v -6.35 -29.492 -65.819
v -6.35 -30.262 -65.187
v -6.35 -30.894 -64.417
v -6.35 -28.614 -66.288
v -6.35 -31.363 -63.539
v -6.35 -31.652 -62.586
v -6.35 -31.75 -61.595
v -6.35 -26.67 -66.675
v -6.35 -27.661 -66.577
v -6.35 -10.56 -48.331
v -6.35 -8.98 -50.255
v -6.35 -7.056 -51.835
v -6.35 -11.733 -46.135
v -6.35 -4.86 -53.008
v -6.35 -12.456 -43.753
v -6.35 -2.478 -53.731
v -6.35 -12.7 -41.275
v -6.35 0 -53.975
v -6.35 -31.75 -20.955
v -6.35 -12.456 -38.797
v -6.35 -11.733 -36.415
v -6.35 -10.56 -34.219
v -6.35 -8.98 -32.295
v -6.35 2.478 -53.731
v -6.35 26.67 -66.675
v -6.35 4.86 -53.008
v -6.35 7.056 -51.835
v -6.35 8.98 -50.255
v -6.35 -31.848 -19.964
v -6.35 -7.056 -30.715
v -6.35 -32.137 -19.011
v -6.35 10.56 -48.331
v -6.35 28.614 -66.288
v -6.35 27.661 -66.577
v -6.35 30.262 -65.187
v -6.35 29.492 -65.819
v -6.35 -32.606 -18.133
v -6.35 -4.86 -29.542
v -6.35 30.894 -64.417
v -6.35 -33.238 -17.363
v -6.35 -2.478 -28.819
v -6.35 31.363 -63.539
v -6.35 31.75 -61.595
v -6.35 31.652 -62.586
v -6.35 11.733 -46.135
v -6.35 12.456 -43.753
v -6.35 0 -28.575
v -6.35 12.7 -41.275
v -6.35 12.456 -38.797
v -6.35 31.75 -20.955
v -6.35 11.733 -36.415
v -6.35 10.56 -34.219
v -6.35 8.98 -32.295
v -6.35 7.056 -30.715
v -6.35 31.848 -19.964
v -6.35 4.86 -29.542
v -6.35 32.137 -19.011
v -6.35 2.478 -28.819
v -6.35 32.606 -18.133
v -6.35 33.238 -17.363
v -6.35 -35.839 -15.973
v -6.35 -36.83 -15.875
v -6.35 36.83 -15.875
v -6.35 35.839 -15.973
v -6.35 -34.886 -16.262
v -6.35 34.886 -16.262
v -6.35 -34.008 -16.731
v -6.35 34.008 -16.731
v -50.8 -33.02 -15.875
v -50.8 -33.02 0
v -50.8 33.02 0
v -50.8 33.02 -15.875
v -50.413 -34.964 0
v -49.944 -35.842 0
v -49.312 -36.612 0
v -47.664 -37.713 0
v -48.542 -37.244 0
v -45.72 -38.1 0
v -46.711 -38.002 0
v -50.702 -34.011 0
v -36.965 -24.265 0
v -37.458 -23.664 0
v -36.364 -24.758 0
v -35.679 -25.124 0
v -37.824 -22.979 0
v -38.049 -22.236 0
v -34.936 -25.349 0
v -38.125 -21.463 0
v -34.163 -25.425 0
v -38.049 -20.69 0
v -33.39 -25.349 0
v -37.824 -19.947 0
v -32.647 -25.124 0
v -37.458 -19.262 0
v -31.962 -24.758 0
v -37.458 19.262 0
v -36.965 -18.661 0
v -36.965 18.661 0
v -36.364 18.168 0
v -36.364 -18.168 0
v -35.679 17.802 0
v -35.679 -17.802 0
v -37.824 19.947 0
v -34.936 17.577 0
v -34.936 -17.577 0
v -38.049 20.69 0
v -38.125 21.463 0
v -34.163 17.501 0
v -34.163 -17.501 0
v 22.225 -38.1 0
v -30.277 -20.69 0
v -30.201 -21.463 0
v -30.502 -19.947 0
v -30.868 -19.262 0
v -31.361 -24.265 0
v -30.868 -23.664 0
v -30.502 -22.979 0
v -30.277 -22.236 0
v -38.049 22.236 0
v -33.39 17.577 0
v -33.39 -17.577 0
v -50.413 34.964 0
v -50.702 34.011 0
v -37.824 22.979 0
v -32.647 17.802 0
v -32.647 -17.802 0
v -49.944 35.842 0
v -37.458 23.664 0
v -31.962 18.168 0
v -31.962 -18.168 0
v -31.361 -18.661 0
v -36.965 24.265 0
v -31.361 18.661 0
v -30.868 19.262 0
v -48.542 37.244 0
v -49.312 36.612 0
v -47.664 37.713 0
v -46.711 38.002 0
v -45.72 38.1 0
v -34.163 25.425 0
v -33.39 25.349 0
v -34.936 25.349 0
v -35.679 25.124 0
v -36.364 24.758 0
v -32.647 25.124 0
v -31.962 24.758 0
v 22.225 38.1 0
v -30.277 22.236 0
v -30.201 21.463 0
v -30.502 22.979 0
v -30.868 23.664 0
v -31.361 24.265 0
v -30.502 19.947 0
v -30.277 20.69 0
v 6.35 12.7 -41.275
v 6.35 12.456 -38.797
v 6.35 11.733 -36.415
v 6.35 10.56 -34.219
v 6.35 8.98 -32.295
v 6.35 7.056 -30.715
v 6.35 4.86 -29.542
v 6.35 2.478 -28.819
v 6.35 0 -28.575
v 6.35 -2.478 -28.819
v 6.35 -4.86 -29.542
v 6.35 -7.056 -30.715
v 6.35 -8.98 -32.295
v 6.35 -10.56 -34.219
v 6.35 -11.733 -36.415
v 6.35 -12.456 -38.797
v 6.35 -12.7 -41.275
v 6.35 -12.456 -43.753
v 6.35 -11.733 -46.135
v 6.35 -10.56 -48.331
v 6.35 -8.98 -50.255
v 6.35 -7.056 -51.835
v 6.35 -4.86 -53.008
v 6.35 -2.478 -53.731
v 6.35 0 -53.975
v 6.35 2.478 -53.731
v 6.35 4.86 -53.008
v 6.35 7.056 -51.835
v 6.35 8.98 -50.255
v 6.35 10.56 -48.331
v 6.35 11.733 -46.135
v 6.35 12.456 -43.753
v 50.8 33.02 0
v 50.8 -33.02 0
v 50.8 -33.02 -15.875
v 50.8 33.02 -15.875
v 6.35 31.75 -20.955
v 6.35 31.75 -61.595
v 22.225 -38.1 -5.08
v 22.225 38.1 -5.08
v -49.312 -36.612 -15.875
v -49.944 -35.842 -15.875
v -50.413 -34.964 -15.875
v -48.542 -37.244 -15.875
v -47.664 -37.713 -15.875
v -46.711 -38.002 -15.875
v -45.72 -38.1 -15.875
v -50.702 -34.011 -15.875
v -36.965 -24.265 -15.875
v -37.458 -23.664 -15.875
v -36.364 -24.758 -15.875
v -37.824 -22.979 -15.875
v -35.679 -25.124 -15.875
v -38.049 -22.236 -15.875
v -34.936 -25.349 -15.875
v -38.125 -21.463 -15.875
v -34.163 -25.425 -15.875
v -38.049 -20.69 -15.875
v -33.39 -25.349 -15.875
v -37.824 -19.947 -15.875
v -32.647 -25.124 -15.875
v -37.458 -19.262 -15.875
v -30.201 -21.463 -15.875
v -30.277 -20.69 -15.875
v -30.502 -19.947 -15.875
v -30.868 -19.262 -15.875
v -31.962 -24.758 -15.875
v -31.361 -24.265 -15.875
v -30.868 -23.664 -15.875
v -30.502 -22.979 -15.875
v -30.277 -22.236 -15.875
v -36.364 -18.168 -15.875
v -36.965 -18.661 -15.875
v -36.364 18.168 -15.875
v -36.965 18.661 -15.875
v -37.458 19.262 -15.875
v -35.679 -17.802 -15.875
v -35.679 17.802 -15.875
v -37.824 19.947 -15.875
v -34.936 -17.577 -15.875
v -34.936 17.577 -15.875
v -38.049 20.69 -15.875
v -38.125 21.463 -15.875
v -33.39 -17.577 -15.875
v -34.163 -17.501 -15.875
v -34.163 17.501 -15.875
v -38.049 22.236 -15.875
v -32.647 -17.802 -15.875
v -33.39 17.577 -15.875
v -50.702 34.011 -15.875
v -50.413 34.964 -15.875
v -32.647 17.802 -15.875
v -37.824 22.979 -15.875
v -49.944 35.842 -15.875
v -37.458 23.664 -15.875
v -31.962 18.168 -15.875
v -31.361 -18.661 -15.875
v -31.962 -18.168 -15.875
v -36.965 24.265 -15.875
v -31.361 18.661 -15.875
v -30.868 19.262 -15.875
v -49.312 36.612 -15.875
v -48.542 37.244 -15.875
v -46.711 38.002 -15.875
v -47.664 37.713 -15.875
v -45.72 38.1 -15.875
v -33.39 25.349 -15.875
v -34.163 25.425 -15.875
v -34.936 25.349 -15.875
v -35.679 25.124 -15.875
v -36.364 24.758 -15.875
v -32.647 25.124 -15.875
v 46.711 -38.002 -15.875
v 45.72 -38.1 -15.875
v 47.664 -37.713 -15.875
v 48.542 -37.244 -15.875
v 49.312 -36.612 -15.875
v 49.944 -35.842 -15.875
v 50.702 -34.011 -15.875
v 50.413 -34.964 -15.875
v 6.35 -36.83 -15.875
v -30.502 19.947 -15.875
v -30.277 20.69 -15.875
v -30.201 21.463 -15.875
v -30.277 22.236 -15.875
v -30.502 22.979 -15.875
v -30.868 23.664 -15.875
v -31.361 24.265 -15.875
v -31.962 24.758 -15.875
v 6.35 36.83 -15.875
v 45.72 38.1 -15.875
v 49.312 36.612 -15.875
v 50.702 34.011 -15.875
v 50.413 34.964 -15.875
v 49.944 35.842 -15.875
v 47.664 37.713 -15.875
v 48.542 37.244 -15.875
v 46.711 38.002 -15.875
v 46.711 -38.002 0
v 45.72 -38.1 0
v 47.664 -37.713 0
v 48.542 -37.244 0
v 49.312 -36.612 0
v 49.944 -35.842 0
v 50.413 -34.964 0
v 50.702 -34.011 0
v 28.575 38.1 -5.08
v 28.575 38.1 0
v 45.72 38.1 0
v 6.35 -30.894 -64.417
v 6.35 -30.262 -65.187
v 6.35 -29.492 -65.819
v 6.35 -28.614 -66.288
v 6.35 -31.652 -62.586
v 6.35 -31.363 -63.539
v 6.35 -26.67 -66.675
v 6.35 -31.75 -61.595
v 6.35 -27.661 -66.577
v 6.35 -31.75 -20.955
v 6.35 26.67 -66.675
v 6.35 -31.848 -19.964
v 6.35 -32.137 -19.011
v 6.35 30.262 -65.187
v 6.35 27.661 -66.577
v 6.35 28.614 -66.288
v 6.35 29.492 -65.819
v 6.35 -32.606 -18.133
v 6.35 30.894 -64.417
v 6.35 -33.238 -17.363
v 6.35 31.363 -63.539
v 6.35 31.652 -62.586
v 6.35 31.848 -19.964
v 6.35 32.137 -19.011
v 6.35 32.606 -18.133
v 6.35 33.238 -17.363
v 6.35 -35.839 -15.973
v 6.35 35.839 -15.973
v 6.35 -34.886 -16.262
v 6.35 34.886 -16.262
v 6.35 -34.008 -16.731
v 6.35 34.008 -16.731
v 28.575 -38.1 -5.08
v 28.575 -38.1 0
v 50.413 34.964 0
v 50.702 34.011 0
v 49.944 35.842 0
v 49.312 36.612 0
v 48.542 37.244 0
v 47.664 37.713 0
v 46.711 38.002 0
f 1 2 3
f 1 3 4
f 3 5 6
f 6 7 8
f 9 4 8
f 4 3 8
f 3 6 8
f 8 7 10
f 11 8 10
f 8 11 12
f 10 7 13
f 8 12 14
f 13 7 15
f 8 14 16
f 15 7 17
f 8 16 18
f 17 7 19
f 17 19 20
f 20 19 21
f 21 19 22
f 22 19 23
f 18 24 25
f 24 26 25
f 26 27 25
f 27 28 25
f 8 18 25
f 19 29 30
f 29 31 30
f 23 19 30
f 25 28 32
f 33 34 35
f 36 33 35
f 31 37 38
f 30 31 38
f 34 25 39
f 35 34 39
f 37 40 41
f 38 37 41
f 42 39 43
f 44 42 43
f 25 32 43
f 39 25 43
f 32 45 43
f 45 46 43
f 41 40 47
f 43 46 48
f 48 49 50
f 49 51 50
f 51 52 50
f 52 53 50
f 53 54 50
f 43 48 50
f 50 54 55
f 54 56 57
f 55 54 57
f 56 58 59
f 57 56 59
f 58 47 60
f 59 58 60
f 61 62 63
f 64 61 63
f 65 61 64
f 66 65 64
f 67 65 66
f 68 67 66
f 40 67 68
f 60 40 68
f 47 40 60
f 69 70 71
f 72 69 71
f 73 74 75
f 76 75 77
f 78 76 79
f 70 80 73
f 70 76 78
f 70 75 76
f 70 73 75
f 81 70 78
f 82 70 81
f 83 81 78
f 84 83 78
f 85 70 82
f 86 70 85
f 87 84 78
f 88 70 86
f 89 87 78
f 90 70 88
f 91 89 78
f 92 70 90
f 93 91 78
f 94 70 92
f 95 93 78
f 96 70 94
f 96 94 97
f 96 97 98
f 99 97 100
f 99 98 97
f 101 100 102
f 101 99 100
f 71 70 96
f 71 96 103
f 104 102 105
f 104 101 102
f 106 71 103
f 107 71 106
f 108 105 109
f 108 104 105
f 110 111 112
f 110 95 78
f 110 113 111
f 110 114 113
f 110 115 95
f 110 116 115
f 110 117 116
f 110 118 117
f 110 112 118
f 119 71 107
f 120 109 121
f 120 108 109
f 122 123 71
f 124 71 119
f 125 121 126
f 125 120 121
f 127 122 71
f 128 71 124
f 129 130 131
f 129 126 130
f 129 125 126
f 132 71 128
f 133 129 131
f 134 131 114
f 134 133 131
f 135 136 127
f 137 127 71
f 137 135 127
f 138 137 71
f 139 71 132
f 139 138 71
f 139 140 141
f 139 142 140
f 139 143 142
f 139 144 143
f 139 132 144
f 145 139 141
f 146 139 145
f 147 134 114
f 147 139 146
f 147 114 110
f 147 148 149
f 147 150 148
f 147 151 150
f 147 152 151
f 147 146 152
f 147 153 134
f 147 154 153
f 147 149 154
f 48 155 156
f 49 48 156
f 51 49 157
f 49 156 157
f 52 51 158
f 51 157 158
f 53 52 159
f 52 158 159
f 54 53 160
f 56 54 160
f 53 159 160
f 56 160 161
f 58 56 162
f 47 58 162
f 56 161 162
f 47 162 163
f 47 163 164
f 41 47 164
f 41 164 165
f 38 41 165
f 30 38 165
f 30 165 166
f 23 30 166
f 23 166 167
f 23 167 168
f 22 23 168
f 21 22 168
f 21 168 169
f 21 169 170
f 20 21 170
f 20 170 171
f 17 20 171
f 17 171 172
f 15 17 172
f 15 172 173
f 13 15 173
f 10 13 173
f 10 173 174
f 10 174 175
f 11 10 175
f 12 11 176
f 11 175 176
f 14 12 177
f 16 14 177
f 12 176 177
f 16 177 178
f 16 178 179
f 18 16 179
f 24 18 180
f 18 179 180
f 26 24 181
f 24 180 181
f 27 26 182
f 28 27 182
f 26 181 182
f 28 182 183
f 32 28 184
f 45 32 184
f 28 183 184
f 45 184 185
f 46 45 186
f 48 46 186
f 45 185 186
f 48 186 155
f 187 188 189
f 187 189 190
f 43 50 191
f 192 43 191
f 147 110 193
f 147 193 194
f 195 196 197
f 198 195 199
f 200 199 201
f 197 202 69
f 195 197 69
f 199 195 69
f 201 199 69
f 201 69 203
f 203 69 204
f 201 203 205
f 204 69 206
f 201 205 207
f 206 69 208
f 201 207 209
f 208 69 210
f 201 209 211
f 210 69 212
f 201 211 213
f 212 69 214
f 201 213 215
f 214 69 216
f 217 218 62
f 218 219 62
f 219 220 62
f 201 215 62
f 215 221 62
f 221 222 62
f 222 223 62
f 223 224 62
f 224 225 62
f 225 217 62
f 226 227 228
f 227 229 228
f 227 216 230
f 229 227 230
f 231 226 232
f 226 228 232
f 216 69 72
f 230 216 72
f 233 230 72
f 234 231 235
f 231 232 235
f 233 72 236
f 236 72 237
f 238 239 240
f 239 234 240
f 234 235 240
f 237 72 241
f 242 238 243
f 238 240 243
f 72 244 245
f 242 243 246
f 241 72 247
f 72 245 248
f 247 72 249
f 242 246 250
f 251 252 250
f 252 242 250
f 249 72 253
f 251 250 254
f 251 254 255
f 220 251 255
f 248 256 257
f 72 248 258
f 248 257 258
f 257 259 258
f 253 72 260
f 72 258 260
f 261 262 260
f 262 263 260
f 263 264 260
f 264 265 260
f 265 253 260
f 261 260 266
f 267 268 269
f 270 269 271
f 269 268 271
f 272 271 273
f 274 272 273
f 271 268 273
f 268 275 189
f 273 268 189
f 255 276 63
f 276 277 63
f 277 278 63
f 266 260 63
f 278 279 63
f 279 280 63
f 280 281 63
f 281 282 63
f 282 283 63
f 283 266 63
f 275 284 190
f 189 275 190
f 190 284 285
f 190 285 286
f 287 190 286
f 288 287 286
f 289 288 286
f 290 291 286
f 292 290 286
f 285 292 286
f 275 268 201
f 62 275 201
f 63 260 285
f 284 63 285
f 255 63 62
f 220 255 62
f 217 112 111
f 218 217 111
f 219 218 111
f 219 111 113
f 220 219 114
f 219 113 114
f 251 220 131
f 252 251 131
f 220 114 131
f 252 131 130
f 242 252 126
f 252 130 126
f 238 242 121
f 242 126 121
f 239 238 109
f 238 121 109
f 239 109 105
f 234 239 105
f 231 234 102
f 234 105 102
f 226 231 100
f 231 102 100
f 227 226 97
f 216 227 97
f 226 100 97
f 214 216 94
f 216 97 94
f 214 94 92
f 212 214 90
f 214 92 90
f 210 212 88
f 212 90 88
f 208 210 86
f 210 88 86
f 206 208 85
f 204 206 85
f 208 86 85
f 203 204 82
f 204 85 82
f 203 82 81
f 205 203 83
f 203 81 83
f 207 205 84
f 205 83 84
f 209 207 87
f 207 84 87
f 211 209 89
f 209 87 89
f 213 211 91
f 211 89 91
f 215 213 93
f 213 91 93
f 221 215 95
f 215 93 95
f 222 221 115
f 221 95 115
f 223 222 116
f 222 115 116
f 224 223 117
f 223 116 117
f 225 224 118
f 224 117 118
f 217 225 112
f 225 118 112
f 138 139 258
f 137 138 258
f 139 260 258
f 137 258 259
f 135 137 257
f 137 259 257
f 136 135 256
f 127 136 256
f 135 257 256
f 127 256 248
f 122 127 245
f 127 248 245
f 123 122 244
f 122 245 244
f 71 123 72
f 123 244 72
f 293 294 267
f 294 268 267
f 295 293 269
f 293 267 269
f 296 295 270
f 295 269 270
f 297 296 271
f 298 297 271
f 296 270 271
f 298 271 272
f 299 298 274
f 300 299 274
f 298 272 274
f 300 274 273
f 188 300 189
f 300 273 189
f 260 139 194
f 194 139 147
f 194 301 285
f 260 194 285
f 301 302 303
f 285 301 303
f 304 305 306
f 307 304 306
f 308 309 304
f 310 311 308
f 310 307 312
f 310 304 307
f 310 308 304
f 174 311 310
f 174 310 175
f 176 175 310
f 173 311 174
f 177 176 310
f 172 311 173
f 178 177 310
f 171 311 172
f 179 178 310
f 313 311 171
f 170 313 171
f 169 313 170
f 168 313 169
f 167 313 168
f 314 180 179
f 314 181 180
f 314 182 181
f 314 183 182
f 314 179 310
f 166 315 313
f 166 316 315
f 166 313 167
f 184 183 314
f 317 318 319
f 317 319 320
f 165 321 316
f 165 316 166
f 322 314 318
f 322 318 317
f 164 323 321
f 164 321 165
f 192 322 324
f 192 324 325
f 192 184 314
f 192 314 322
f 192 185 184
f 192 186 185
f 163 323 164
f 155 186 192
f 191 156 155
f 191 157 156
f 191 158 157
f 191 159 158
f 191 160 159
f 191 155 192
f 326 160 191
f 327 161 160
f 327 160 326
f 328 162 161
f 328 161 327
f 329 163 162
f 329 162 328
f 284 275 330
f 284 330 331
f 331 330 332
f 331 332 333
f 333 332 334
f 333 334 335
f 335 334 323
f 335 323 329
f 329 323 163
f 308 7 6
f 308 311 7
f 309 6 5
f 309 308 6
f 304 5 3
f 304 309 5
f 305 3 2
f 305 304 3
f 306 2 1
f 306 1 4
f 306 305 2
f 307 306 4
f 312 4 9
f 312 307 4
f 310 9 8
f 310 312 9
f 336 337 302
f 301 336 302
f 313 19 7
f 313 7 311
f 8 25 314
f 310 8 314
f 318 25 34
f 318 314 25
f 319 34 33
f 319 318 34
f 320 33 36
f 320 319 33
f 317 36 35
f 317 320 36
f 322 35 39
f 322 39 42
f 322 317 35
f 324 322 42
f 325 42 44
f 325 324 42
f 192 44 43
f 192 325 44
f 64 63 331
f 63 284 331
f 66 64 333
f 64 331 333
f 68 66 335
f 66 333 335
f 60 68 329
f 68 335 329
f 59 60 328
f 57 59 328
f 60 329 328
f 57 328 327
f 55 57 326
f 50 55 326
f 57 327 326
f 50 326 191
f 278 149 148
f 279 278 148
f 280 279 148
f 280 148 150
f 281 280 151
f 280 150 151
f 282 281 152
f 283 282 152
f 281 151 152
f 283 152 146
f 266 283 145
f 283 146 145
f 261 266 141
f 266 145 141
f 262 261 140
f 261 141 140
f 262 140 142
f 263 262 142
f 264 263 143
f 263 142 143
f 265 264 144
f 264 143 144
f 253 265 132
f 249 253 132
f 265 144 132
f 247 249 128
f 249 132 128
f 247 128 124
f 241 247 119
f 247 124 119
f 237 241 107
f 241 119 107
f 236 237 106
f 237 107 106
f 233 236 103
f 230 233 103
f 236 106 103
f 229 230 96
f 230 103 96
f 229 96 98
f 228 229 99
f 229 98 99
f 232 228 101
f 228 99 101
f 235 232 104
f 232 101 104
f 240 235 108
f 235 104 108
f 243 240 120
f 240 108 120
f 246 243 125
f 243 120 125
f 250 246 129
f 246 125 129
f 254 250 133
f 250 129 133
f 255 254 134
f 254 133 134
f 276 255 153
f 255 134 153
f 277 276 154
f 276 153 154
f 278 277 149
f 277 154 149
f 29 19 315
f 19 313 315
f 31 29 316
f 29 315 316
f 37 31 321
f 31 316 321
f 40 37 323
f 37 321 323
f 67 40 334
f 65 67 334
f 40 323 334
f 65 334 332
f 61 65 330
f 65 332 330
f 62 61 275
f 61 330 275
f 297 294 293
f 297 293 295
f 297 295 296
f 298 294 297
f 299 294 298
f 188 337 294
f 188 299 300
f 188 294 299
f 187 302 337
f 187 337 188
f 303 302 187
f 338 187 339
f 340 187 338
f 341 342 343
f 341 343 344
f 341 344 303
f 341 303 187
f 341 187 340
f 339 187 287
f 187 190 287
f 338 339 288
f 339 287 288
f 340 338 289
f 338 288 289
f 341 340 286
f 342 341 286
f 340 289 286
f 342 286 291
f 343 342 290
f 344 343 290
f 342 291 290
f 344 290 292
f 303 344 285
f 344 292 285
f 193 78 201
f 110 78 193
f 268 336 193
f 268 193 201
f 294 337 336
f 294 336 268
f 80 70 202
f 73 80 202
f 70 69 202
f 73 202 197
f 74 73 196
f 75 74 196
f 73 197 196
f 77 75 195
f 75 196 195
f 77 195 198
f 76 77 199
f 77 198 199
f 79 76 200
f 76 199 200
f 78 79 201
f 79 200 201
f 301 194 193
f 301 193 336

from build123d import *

# Parameters (mm, degrees)
F0_W     = 101.6
F0_H     = 76.2
F0_R     = 3.9624
F0_W_2   = 12.7
F0_H_2   = 63.5
F1_DEPTH = 15.875
F2_DEPTH = 66.675
F3_W     = 6.35
F3_H     = 76.2
F4_DEPTH = 5.08
F5_R     = 12.7
F6_DEPTH = 25.4
F7_R     = 5.08


with BuildPart() as f1:
    # F0 (on Top) → F1 (new body)
    with BuildSketch(Plane.XY):
        Rectangle(F0_W, F0_H)
        with Locations((-34.163, -21.463)):
            Circle(F0_R, mode=Mode.SUBTRACT)
        Rectangle(F0_W_2, F0_H_2, mode=Mode.SUBTRACT)
        with Locations((-34.163, 21.463)):
            Circle(F0_R, mode=Mode.SUBTRACT)
    extrude(amount=-F1_DEPTH)

    # F0 (on Top) → F2 (join)
    with BuildSketch(Plane.XY):
        Rectangle(F0_W_2, F0_H_2)
    extrude(amount=-F2_DEPTH)

    # F3 (on face) → F4 (cut)
    with BuildSketch(Plane.XY):
        with Locations((25.4, 0)):
            Rectangle(F3_W, F3_H)
    extrude(amount=-F4_DEPTH, mode=Mode.SUBTRACT)

    # F5 (on face) → F6 (cut)
    with BuildSketch(Plane.YZ.offset(6.35)):
        with Locations((0, -41.275)):
            Circle(F5_R)
    extrude(amount=-F6_DEPTH, mode=Mode.SUBTRACT)

    # F7 (call 1 of 8: OpenCascade refuses the feature's edges together)
    f7_edges = [f1.edges().sort_by_distance(p)[0] for p in [
        (50.8, -38.1, -7.9375),
    ]]
    fillet(f7_edges, radius=F7_R)

    # F7#2 (call 2 of 8)
    f7_2_edges = [f1.edges().sort_by_distance(p)[0] for p in [
        (50.8, 38.1, -7.9375),
    ]]
    fillet(f7_2_edges, radius=F7_R)

    # F7#3 (call 3 of 8)
    f7_3_edges = [f1.edges().sort_by_distance(p)[0] for p in [
        (-50.8, 38.1, -7.9375),
    ]]
    fillet(f7_3_edges, radius=F7_R)

    # F7#4 (call 4 of 8)
    f7_4_edges = [f1.edges().sort_by_distance(p)[0] for p in [
        (-50.8, -38.1, -7.9375),
    ]]
    fillet(f7_4_edges, radius=F7_R)

    # F7#5 (call 5 of 8)
    f7_5_edges = [f1.edges().sort_by_distance(p)[0] for p in [
        (0, -31.75, -66.675),
    ]]
    fillet(f7_5_edges, radius=F7_R)

    # F7#6 (call 6 of 8)
    f7_6_edges = [f1.edges().sort_by_distance(p)[0] for p in [
        (0, 31.75, -66.675),
    ]]
    fillet(f7_6_edges, radius=F7_R)

    # F7#7 (call 7 of 8)
    f7_7_edges = [f1.edges().sort_by_distance(p)[0] for p in [
        (0, -31.75, -15.875),
    ]]
    fillet(f7_7_edges, radius=F7_R)

    # F7#8 (call 8 of 8)
    f7_8_edges = [f1.edges().sort_by_distance(p)[0] for p in [
        (0, 31.75, -15.875),
    ]]
    fillet(f7_8_edges, radius=F7_R)


solid = f1.part
